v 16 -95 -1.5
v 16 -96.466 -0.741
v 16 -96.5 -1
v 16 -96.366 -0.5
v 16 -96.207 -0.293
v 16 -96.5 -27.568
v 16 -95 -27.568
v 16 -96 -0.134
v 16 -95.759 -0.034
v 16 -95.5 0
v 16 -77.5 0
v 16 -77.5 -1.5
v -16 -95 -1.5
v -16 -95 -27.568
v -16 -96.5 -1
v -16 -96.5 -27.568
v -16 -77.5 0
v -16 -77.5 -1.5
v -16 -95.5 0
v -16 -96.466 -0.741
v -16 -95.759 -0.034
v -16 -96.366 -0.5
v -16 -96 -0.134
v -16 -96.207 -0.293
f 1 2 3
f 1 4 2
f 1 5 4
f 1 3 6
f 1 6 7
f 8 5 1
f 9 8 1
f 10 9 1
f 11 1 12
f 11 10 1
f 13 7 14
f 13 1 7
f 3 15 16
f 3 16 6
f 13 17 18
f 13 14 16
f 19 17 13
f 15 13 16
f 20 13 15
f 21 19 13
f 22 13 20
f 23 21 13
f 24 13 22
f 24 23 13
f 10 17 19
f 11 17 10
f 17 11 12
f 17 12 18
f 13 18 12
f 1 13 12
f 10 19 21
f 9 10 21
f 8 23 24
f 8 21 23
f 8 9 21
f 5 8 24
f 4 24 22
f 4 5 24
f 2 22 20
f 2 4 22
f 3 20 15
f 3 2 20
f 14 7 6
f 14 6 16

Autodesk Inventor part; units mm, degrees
ref_plane "YZ Plane" through (0, 0, 0) normal (1, 0, 0) x (0, 1, 0)
ref_plane "XZ Plane" through (0, 0, 0) normal (0, 1, 0) x (-1, 0, 0)
sketch "Szkic1" plane through (0, 0, 0) normal (0, 0, 1) x (1, 0, 0)
  line L0 (16, -77.5) -> (-16, -77.5)
  line L1 (-16, -77.5) -> (-16, -96.5)
  line L2 (-16, -96.5) -> (16, -96.5)
  line L3 (16, -96.5) -> (16, -77.5)
  point P0 (0, 0)
  dimension "d1" = 32
extrude "Wyciągnięcie proste1" add sketch "Szkic1" against normal blind 1.5
sketch "Szkic2" plane through (0, 0, -1.5) normal (0, 0, -1) x (-1, 0, 0)
  line L0 (-16, -77.5) -> (-16, -96.5) projected
  line L1 (16, -96.5) -> (-16, -96.5)
  line L2 (-16, -96.5) -> (-16, -95)
  line L3 (-16, -95) -> (16, -95)
  line L4 (16, -95) -> (16, -96.5)
  point P0 (0, 0)
  dimension "d5" = 1.5
ref_plane "Płaszczyzna konstrukcyjna1" through (-22.5, -96.5, -27.5684) normal (0, 0, -1) x (0, 1, 0)
extrude "Wyciągnięcie proste2" add sketch "Szkic2" along normal up to surface (26.0684 mm away)
fillet "Zaokrąglenie1" radius 1 1 edges at (0, -96.5, 0)
properties part number "ZAŚLEPKA PRZEDNIA DOLNA CZARNEJ OBUDOWY STOJAKA" material "Tworzywo sztuczne, nieprzezroczyste czarne"
